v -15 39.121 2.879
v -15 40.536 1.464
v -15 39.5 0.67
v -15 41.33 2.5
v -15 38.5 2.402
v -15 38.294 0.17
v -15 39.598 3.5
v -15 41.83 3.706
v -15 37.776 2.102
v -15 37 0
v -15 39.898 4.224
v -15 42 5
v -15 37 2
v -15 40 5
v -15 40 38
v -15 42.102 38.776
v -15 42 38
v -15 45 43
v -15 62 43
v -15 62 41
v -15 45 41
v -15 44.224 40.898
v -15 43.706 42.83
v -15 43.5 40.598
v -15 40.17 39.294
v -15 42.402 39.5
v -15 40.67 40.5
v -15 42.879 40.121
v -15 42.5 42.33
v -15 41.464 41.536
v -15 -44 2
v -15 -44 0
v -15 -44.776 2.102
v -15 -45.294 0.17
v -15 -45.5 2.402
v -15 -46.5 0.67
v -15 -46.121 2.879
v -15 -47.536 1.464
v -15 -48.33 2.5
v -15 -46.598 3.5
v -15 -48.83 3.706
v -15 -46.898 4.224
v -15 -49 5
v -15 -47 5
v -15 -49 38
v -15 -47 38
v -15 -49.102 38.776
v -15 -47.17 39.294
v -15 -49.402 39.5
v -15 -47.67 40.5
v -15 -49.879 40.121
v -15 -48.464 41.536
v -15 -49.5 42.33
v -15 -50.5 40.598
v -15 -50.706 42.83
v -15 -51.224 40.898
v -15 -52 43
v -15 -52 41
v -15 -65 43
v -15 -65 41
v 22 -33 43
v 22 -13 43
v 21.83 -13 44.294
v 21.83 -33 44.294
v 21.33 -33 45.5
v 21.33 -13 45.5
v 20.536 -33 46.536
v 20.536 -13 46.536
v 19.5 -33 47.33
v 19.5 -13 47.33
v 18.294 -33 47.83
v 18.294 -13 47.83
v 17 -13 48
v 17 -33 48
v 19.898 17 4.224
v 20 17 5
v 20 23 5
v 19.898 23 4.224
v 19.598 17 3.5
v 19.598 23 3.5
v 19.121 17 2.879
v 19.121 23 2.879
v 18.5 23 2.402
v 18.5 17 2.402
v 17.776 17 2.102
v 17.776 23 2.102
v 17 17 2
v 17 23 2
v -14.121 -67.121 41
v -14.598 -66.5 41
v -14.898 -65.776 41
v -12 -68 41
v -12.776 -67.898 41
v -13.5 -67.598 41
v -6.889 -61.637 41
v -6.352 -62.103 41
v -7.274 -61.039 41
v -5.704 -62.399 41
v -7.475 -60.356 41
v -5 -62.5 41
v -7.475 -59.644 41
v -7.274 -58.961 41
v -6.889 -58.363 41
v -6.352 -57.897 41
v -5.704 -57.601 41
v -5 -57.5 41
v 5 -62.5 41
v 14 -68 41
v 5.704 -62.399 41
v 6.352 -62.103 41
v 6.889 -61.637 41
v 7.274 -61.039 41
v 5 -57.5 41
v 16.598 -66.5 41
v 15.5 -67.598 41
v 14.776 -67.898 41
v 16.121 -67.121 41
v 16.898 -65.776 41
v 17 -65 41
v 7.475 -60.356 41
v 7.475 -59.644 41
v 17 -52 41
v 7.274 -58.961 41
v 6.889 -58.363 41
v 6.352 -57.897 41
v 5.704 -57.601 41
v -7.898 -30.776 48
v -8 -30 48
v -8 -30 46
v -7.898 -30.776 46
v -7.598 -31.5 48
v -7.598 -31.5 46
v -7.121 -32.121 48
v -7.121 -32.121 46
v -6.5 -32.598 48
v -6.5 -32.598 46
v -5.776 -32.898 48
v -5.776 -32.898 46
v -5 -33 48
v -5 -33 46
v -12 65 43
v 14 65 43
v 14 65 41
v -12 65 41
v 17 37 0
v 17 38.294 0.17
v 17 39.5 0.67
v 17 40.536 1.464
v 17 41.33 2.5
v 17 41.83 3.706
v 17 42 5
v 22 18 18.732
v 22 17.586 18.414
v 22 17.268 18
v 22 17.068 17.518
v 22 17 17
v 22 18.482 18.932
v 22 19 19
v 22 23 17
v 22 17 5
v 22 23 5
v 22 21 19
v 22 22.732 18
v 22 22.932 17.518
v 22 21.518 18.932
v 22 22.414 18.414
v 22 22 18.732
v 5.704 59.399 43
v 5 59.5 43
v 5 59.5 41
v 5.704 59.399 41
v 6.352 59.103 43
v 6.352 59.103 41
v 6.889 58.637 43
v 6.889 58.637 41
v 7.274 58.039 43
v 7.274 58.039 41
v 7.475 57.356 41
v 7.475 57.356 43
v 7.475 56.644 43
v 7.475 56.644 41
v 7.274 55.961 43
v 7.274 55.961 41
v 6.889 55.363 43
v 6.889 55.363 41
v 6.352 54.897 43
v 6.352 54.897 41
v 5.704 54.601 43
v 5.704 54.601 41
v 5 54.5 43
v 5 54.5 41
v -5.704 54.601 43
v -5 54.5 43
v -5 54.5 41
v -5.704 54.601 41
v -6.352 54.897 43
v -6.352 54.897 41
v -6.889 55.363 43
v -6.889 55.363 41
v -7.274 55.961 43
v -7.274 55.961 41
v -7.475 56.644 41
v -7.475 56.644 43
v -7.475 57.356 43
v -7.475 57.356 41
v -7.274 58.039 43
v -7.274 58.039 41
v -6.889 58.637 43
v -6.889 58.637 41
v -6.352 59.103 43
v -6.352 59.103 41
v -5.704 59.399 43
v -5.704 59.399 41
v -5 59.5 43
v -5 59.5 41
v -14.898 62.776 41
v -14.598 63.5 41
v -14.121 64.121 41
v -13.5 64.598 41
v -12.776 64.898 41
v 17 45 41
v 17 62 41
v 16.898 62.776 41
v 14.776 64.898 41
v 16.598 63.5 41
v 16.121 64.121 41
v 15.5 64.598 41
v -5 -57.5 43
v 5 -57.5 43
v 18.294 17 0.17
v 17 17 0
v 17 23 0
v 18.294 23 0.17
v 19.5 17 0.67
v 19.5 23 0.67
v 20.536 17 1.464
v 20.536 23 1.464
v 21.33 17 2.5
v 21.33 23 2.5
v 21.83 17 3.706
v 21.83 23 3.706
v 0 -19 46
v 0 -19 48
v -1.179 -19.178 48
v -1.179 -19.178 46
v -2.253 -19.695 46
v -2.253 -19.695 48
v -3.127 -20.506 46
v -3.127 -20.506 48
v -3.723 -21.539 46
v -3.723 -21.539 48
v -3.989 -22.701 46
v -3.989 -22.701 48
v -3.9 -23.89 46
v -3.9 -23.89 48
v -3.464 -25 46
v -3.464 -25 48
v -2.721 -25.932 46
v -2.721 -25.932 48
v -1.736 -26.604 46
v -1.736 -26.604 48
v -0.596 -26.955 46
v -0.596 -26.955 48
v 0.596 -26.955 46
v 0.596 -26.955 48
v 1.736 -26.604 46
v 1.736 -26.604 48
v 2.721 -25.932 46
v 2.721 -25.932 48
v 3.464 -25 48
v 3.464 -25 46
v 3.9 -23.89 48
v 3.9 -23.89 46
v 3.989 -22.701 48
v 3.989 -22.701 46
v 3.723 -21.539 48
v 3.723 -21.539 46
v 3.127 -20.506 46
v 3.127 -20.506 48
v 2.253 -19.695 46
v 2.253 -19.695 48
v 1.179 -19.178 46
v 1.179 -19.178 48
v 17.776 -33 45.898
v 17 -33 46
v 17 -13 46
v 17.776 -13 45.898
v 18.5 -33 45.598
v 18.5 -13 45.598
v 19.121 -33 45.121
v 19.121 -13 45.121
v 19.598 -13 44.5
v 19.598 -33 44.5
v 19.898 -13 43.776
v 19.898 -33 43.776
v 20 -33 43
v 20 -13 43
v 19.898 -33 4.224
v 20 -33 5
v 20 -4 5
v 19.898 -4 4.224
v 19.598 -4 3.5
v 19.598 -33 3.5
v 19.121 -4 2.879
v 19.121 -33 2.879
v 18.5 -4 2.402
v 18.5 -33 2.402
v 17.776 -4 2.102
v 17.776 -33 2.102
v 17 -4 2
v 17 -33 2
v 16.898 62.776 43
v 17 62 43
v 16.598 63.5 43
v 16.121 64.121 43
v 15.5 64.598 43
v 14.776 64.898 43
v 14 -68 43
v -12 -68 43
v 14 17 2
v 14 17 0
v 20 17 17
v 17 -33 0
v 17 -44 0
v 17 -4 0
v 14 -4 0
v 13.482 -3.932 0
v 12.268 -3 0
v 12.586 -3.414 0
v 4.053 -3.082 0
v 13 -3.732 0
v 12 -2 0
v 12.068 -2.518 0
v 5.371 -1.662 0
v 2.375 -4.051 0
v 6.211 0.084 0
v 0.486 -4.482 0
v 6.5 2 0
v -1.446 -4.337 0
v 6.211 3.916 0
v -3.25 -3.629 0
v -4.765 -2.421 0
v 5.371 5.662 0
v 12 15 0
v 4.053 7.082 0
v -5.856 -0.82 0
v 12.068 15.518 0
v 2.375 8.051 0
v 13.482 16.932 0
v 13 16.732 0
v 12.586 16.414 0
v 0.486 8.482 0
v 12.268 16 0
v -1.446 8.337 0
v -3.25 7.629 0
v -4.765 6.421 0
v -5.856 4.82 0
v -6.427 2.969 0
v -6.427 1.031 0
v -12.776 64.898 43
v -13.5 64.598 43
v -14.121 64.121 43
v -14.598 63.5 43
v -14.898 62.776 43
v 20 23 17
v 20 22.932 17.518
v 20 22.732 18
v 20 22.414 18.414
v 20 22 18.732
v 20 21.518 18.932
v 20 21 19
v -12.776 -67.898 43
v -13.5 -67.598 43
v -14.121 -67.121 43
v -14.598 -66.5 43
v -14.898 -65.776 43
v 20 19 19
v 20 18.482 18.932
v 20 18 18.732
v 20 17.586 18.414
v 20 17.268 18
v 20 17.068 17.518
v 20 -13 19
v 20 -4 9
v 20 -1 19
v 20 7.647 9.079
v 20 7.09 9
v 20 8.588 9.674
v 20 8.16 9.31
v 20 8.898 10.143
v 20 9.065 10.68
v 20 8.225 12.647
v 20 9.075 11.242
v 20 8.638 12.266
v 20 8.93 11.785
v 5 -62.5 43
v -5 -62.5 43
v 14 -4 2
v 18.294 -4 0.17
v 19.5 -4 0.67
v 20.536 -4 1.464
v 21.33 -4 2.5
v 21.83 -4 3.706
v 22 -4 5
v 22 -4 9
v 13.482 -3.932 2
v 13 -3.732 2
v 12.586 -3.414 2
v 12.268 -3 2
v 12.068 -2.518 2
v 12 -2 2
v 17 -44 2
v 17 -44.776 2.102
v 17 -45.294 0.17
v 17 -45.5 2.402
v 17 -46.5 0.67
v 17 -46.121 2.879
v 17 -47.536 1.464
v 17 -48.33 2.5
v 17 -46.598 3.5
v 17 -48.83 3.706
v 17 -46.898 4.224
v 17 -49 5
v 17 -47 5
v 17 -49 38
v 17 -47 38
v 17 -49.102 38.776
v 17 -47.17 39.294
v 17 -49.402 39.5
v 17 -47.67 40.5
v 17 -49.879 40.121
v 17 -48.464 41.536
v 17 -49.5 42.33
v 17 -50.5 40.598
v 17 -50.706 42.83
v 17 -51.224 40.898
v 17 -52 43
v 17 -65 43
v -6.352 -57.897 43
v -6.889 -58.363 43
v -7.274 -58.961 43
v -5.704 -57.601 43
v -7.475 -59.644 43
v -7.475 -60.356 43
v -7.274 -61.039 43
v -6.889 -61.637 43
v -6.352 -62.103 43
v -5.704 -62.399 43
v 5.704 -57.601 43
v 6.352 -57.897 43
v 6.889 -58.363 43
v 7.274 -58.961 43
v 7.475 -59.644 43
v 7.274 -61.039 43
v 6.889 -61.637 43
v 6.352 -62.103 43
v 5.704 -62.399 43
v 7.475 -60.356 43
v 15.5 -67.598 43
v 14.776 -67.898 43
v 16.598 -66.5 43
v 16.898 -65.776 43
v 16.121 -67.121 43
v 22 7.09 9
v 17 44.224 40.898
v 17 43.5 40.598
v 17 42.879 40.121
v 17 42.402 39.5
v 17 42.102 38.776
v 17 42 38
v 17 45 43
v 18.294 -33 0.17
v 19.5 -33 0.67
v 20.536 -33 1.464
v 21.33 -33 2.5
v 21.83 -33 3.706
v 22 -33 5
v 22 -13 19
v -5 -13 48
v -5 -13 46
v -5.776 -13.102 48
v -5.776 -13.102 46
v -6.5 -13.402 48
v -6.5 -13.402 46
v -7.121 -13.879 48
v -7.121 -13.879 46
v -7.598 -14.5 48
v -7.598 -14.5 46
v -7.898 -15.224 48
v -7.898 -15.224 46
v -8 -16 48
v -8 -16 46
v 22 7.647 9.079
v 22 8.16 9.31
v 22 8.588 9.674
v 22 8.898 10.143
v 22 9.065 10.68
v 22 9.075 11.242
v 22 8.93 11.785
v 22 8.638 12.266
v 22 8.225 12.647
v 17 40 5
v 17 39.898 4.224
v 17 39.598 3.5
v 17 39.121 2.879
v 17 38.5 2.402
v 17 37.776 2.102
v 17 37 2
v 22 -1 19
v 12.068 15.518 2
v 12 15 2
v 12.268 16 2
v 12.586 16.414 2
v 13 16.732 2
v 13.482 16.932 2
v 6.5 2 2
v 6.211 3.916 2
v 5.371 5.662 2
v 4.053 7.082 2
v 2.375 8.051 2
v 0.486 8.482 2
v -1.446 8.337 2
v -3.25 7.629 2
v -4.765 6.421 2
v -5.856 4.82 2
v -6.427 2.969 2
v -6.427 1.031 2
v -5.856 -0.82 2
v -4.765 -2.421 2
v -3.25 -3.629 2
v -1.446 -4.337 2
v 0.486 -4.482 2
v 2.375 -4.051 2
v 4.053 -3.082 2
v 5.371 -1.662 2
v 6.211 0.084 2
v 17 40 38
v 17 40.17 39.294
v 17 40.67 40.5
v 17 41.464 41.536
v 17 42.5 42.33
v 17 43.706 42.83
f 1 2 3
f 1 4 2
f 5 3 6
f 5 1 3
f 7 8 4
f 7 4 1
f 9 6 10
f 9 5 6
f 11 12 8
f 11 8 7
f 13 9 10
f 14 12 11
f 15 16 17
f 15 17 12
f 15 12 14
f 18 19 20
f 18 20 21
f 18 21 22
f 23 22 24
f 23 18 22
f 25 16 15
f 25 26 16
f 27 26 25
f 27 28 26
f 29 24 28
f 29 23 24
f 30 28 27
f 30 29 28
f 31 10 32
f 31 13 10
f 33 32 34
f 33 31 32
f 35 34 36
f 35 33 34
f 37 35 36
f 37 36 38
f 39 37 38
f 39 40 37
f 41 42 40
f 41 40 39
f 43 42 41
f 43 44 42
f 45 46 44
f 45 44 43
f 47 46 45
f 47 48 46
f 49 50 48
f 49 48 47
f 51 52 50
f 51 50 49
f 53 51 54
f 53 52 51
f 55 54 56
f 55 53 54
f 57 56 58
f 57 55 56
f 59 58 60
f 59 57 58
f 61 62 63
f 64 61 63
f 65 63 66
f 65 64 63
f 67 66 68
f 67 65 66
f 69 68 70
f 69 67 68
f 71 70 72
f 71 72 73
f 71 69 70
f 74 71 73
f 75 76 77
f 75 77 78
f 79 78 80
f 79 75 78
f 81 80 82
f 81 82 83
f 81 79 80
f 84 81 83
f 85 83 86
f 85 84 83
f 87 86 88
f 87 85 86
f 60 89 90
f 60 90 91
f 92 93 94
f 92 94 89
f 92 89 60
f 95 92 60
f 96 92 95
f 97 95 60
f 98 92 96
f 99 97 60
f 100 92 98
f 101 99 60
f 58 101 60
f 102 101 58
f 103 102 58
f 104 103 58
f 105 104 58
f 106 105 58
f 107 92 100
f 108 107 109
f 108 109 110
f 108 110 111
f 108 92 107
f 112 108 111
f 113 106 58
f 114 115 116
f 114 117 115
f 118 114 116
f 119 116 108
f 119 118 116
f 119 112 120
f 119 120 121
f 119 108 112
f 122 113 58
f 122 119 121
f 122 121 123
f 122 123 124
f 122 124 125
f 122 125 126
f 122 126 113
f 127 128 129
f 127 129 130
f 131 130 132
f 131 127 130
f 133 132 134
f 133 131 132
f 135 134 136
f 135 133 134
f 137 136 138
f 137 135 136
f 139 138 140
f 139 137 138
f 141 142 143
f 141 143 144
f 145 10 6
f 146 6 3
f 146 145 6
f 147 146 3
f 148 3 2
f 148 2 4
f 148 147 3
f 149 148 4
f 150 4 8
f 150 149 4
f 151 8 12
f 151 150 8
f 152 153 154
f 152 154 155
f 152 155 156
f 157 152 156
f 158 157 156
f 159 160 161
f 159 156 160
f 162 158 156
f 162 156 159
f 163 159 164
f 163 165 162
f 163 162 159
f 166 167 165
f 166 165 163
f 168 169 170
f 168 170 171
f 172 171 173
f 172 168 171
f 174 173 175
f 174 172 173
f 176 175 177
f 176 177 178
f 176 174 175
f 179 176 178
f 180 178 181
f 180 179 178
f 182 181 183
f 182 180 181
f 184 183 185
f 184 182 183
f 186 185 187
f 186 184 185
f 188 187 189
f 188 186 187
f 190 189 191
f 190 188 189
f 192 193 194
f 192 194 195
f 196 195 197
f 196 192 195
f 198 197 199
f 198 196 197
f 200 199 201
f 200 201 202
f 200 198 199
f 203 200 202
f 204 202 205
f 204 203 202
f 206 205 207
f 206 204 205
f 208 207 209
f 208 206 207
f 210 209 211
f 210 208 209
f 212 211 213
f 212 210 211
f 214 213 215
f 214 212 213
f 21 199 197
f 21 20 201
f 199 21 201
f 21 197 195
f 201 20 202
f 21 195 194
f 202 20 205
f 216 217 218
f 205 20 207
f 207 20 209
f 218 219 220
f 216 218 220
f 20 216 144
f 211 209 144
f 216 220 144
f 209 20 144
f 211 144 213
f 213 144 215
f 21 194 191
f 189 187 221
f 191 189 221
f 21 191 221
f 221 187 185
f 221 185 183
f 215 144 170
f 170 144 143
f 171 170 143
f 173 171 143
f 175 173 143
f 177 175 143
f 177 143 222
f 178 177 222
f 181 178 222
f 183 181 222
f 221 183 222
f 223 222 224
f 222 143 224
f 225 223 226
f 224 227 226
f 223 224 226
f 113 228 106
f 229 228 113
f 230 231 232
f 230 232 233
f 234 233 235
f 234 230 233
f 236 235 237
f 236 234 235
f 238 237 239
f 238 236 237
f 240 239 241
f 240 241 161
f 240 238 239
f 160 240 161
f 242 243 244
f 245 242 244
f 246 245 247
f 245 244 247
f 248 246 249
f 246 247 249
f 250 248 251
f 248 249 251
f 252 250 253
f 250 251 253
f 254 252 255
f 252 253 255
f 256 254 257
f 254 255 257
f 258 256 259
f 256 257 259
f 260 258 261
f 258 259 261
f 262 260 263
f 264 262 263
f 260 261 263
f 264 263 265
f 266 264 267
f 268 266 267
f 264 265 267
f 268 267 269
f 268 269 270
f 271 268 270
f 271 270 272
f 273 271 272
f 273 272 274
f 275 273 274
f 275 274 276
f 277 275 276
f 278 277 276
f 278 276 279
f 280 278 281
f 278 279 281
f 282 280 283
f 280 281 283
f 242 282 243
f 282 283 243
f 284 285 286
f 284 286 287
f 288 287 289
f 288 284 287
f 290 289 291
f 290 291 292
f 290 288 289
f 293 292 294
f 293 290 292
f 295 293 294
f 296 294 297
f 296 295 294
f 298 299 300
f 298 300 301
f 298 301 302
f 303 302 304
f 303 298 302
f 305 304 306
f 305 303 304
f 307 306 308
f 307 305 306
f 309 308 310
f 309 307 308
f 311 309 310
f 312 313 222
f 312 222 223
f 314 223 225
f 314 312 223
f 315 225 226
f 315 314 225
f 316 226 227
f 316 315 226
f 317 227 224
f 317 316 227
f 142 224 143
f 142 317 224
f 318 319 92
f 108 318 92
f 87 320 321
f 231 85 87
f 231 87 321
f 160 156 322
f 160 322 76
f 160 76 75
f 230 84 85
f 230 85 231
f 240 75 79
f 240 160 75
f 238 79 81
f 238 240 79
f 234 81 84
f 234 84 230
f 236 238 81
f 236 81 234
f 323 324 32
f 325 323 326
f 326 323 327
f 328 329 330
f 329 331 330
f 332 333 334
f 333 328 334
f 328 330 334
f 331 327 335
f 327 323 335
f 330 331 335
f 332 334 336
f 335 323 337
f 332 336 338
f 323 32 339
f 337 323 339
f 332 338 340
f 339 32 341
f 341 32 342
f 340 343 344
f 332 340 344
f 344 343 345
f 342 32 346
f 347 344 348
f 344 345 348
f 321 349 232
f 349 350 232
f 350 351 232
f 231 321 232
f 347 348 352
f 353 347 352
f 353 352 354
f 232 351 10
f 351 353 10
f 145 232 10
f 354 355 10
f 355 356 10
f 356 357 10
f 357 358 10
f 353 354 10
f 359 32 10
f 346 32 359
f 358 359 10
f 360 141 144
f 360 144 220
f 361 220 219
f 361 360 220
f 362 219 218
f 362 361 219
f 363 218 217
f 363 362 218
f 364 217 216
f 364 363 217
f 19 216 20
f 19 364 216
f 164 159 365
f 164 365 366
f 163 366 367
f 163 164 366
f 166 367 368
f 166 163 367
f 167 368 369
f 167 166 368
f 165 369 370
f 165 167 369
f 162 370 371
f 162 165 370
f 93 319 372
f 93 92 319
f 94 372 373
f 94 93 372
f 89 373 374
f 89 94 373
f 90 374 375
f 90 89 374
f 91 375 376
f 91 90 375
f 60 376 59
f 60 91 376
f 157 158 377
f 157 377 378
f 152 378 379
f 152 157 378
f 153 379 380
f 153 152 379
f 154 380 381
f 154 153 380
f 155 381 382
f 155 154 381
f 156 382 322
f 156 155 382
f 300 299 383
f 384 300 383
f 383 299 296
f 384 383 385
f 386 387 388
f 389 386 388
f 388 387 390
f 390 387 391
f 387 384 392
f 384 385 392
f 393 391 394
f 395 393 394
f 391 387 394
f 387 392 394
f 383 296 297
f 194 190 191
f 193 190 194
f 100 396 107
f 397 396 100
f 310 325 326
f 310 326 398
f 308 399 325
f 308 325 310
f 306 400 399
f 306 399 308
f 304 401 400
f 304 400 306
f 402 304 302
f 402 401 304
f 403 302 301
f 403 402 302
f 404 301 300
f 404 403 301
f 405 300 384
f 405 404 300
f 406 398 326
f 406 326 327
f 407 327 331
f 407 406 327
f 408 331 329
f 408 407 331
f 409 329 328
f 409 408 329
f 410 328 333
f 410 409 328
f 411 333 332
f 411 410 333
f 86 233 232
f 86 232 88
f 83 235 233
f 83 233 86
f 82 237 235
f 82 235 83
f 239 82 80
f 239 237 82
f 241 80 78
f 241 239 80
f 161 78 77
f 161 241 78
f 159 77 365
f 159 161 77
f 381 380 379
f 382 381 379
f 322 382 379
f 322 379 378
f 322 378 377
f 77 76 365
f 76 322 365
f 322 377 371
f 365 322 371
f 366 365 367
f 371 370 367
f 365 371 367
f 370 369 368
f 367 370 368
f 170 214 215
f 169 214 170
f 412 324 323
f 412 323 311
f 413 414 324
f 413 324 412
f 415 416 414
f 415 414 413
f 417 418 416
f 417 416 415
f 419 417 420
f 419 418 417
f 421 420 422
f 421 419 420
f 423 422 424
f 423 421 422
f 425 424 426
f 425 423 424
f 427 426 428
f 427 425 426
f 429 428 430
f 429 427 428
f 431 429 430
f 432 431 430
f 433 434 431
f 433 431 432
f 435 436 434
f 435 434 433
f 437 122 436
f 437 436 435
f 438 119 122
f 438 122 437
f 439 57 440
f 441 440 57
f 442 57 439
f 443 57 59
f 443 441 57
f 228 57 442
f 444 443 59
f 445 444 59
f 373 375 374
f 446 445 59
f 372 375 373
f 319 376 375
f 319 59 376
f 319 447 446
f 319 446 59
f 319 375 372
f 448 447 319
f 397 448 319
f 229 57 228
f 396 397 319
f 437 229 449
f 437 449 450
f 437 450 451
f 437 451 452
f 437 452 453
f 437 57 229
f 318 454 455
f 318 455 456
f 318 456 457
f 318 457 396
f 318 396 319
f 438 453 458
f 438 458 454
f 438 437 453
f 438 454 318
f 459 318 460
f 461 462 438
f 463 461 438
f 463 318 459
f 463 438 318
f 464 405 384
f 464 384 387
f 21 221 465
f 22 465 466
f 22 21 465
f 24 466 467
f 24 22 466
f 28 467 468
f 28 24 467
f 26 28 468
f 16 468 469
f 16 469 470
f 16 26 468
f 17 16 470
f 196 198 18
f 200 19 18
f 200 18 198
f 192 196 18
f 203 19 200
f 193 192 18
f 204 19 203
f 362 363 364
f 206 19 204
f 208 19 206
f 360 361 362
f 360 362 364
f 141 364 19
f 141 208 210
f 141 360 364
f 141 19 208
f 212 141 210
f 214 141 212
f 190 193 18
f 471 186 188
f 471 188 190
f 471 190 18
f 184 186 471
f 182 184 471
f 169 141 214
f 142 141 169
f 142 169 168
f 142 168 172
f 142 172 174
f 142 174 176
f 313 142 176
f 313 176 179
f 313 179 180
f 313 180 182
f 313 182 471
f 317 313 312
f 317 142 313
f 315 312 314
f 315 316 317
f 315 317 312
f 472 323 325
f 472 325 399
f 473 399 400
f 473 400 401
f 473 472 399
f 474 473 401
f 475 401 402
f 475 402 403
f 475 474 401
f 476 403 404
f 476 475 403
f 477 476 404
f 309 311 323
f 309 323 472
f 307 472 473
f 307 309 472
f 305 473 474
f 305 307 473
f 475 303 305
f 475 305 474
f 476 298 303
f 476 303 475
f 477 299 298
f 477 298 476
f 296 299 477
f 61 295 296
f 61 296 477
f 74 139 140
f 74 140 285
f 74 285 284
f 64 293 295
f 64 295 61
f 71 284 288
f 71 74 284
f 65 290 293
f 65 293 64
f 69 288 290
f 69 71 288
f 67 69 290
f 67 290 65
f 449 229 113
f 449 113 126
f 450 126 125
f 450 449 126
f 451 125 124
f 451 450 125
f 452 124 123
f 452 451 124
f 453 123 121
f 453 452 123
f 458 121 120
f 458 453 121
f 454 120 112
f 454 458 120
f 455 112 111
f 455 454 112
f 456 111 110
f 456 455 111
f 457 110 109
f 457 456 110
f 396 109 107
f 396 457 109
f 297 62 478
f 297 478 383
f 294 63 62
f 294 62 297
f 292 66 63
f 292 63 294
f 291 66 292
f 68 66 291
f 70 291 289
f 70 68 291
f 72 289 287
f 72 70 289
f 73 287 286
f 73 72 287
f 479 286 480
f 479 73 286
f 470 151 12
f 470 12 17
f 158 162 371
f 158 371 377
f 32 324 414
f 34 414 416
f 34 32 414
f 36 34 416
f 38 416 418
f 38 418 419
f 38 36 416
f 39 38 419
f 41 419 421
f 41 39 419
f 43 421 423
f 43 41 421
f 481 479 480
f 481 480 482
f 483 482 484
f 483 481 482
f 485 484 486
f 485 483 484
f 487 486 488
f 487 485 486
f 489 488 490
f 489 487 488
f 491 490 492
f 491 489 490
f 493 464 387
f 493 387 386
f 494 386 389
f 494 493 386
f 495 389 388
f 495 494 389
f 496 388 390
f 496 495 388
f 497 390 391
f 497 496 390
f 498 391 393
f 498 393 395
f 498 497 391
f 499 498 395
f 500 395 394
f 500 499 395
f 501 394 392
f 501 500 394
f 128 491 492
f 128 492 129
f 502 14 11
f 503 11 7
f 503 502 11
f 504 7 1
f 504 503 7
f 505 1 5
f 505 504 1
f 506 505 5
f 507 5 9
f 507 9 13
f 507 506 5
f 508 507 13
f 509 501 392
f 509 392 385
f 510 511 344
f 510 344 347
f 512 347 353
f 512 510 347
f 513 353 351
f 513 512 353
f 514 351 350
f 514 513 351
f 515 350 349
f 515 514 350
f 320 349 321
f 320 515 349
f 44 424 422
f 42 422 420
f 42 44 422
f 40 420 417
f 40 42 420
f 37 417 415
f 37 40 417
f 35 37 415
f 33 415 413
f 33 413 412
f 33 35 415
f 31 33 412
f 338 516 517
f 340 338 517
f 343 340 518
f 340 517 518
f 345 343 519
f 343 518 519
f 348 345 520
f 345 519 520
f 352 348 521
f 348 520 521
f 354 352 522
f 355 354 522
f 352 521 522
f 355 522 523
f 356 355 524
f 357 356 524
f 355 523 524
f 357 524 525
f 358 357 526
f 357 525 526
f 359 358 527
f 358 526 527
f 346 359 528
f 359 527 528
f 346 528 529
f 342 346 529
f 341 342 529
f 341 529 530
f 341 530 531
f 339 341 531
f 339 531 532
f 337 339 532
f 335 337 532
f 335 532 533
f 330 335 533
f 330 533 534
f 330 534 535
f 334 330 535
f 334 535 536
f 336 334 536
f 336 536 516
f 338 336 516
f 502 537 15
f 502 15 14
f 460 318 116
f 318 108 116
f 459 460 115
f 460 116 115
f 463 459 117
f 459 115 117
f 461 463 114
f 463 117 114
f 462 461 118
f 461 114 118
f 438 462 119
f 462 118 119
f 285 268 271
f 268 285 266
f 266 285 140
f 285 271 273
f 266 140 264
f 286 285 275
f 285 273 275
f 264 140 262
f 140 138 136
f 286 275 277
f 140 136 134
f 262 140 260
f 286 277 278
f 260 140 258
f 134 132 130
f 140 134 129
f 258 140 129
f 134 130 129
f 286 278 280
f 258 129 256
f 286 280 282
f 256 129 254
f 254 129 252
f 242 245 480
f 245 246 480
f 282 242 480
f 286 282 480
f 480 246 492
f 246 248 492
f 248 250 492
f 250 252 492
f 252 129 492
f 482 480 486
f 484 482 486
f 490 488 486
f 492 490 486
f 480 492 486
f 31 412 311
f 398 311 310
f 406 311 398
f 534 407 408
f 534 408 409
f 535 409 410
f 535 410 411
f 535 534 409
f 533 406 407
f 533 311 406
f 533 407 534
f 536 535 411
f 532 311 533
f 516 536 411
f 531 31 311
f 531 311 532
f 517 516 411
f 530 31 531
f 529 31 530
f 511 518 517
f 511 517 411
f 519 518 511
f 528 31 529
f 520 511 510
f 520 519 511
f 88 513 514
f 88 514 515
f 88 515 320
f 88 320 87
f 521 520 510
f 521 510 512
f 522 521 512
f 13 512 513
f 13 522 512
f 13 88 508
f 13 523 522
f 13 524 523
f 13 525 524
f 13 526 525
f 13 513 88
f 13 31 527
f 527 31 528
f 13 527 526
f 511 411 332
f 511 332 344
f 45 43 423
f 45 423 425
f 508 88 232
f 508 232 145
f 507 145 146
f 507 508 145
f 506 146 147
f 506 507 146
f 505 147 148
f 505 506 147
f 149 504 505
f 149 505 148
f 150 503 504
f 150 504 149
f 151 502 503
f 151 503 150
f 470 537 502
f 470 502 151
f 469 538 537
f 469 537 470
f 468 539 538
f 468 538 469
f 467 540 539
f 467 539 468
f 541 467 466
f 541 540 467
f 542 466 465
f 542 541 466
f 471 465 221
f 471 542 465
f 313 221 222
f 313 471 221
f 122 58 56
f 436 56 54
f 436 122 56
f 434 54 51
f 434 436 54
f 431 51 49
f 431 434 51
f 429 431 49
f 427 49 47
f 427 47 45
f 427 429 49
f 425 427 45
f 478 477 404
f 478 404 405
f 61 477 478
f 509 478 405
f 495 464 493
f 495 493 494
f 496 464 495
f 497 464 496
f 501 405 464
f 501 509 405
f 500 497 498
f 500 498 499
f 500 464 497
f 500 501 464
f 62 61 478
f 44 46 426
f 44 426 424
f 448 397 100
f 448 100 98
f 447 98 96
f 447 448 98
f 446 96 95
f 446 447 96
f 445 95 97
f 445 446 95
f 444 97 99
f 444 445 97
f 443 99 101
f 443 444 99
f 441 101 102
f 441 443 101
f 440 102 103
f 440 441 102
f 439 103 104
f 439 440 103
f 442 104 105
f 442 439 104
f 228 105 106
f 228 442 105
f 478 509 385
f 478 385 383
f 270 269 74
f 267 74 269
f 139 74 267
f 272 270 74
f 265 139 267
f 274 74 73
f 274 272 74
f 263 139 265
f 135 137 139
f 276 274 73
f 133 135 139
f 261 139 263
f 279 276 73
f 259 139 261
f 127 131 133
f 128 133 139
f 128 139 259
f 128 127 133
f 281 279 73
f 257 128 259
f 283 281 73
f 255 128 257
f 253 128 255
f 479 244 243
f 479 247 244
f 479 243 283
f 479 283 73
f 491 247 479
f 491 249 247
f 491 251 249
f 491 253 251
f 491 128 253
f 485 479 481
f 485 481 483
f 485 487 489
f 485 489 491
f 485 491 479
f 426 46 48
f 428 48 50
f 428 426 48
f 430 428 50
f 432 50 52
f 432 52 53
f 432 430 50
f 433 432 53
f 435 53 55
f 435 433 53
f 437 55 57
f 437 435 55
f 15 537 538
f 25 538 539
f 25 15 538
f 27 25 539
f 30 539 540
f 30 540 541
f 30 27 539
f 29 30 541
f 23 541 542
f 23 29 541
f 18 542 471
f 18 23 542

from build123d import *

# Parameters (mm, degrees)
SKETCH1_W                    = 91
SKETCH1_H                    = 32
BASE_FLANGE1_DEPTH           = 2
EDGE_FLANGE1_STRIP_W         = 14
EDGE_FLANGE1_STRIP_H         = 2
EDGE_FLANGE1_STRIP_CUT_DEPTH = 32
EDGE_FLANGE1_DEPTH           = 32
EDGE_FLANGE2_STRIP_W         = 14
EDGE_FLANGE2_STRIP_H         = 2
EDGE_FLANGE2_STRIP_CUT_DEPTH = 32
EDGE_FLANGE2_DEPTH           = 32
FILLET1_R                    = 3
EDGE_FLANGE3_DEPTH           = 29
EDGE_FLANGE3_START           = 2
EDGE_FLANGE3_FLAT_DEPTH      = 2
EDGE_FLANGE4_DEPTH           = 20
EDGE_FLANGE4_START           = 2
EDGE_FLANGE4_PROFILE_R       = 4
EDGE_FLANGE4_FLAT_DEPTH      = 2
SKETCH18_R                   = 6.5
CUT_EXTRUDE1_DEPTH           = 10
EDGE_FLANGE5_DEPTH           = 6
EDGE_FLANGE5_START           = 2
EDGE_FLANGE5_FLAT_DEPTH      = 2
EDGE_FLANGE6_STRIP_W         = 14
EDGE_FLANGE6_STRIP_H         = 2
EDGE_FLANGE6_STRIP_CUT_DEPTH = 32
EDGE_FLANGE6_DEPTH           = 32
EDGE_FLANGE7_STRIP_W         = 14
EDGE_FLANGE7_STRIP_H         = 2
EDGE_FLANGE7_STRIP_CUT_DEPTH = 32
EDGE_FLANGE7_DEPTH           = 32
EDGE_FLANGE7_FLAT_DEPTH      = 2
CUT_EXTRUDE2_DEPTH           = 10


# Sheet-metal steps are written as plain solids
with BuildPart() as part:
    # Sketch1 → Base-Flange1 (new body)
    with BuildSketch(Plane(origin=(0, 0, 0), x_dir=(0, 1, 0), z_dir=(0, 0, 1))):
        with Locations((-3.5, -1)):
            Rectangle(SKETCH1_W, SKETCH1_H)
    extrude(amount=BASE_FLANGE1_DEPTH)

    # Edge-Flange1 strip (across the edge) → Edge-Flange1 strip cut (cut)
    with BuildSketch(Plane(origin=(-15, -49, 2), x_dir=(0, 1, 0), z_dir=(1, 0, 0))):
        with Locations((-2, -1)):
            Rectangle(EDGE_FLANGE1_STRIP_W, EDGE_FLANGE1_STRIP_H)
    extrude(amount=EDGE_FLANGE1_STRIP_CUT_DEPTH, mode=Mode.SUBTRACT)

    # Edge-Flange1 section (across the edge) → Edge-Flange1 (add)
    with BuildSketch(Plane(origin=(-15, -49, 2), x_dir=(0, 1, 0), z_dir=(1, 0, 0))):
        with BuildLine():
            Line((0, 3), (0, 41))
            Line((0, 41), (2, 41))
            Line((2, 41), (2, 3))
            ThreePointArc((2, 3), (2.878679656, 0.878679656), (5, 0))
            Line((5, 0), (5, -2))
            ThreePointArc((5, -2), (1.464466094, -0.535533906), (0, 3))
        make_face()
    extrude(amount=EDGE_FLANGE1_DEPTH)

    # Edge-Flange2 strip (across the edge) → Edge-Flange2 strip cut (cut)
    with BuildSketch(Plane(origin=(17, -49, 43), x_dir=(0, 0, -1), z_dir=(-1, 0, 0))):
        with Locations((-2, -1)):
            Rectangle(EDGE_FLANGE2_STRIP_W, EDGE_FLANGE2_STRIP_H)
    extrude(amount=EDGE_FLANGE2_STRIP_CUT_DEPTH, mode=Mode.SUBTRACT)

    # Edge-Flange2 section (across the edge) → Edge-Flange2 (add)
    with BuildSketch(Plane(origin=(17, -49, 43), x_dir=(0, 0, -1), z_dir=(-1, 0, 0))):
        with BuildLine():
            Line((0, 3), (0, 19))
            Line((0, 19), (2, 19))
            Line((2, 19), (2, 3))
            ThreePointArc((2, 3), (2.878679656, 0.878679656), (5, 0))
            Line((5, 0), (5, -2))
            ThreePointArc((5, -2), (1.464466094, -0.535533906), (0, 3))
        make_face()
    extrude(amount=EDGE_FLANGE2_DEPTH)

    # Fillet1
    fillet1_edges = [part.edges().sort_by_distance(p)[0] for p in [
        (17, -68, 42),
        (-15, -68, 42),
    ]]
    fillet(fillet1_edges, radius=FILLET1_R)

    # Edge-Flange3 bend section (across the edge) → Edge-Flange3 (add)
    with BuildSketch(Plane(origin=(20, -33, 2), x_dir=(-1, 0, 0), z_dir=(0, 1, 0))):
        with BuildLine():
            Line((-2, 3), (0, 3))
            ThreePointArc((0, 3), (0.878679656, 0.878679656), (3, 0))
            Line((3, 0), (3, -2))
            ThreePointArc((3, -2), (-0.535533906, -0.535533906), (-2, 3))
        make_face()
    extrude(amount=EDGE_FLANGE3_DEPTH)

    # Edge-Flange3 profile (on flange) → Edge-Flange3 flat (add)
    with BuildSketch(Plane(origin=(20, 0, 2), x_dir=(0, 1, 0), z_dir=(1, 0, 0)).offset(EDGE_FLANGE3_START)):
        with BuildLine():
            Line((-33, 41), (-33, 3))
            Line((-33, 3), (-4, 3))
            Line((-4, 3), (-4, 7))
            Line((-4, 7), (7.090242207, 7))
            ThreePointArc((7.090242207, 7), (9, 8.406009114), (8.22462093, 10.647174828))
            Line((8.22462093, 10.647174828), (-1, 17))
            Line((-1, 17), (-13, 17))
            Line((-13, 17), (-13, 41))
            Line((-13, 41), (-33, 41))
        make_face()
    extrude(amount=-EDGE_FLANGE3_FLAT_DEPTH)

    # Edge-Flange4 bend section (across the edge) → Edge-Flange4 (add)
    with BuildSketch(Plane(origin=(20, -33, 46), x_dir=(0, 0, -1), z_dir=(0, 1, 0))):
        with BuildLine():
            Line((-2, 3), (0, 3))
            ThreePointArc((0, 3), (0.878679656, 0.878679656), (3, 0))
            Line((3, 0), (3, -2))
            ThreePointArc((3, -2), (-0.535533906, -0.535533906), (-2, 3))
        make_face()
    extrude(amount=EDGE_FLANGE4_DEPTH)

    # Edge-Flange4 profile (on flange) → Edge-Flange4 flat (add)
    with BuildSketch(Plane(origin=(20, 0, 46), x_dir=(0, 1, 0), z_dir=(0, 0, 1)).offset(EDGE_FLANGE4_START)):
        with BuildLine():
            ThreePointArc((-13, 25), (-13.878679656, 27.121320344), (-16, 28))
            Line((-16, 28), (-30, 28))
            ThreePointArc((-30, 28), (-32.121320344, 27.121320344), (-33, 25))
            Line((-33, 25), (-33, 3))
            Line((-33, 3), (-13, 3))
            Line((-13, 3), (-13, 25))
        make_face()
        with Locations((-23, 20)):
            Circle(EDGE_FLANGE4_PROFILE_R, mode=Mode.SUBTRACT)
    extrude(amount=-EDGE_FLANGE4_FLAT_DEPTH)

    # Sketch18 → Cut-Extrude1 (cut)
    with BuildSketch(Plane.XY.offset(2)):
        with Locations((0, 2)):
            Circle(SKETCH18_R)
        with BuildLine():
            Line((17, -4), (14, -4))
            ThreePointArc((14, -4), (12.585786438, -3.414213562), (12, -2))
            Line((12, -2), (12, 15))
            ThreePointArc((12, 15), (12.585786438, 16.414213562), (14, 17))
            Line((14, 17), (17, 17))
            Line((17, 17), (17, -4))
        make_face()
    extrude(amount=-CUT_EXTRUDE1_DEPTH, mode=Mode.SUBTRACT)

    # Edge-Flange5 bend section (across the edge) → Edge-Flange5 (add)
    with BuildSketch(Plane(origin=(20, 17, 2), x_dir=(-1, 0, 0), z_dir=(0, 1, 0))):
        with BuildLine():
            Line((-2, 3), (0, 3))
            ThreePointArc((0, 3), (0.878679656, 0.878679656), (3, 0))
            Line((3, 0), (3, -2))
            ThreePointArc((3, -2), (-0.535533906, -0.535533906), (-2, 3))
        make_face()
    extrude(amount=EDGE_FLANGE5_DEPTH)

    # Edge-Flange5 profile (on flange) → Edge-Flange5 flat (add)
    with BuildSketch(Plane(origin=(20, 0, 2), x_dir=(0, 1, 0), z_dir=(1, 0, 0)).offset(EDGE_FLANGE5_START)):
        with BuildLine():
            Line((17, 3), (23, 3))
            Line((23, 3), (23, 15))
            ThreePointArc((23, 15), (22.414213562, 16.414213562), (21, 17))
            Line((21, 17), (19, 17))
            ThreePointArc((19, 17), (17.585786438, 16.414213562), (17, 15))
            Line((17, 15), (17, 3))
        make_face()
    extrude(amount=-EDGE_FLANGE5_FLAT_DEPTH)

    # Edge-Flange6 strip (across the edge) → Edge-Flange6 strip cut (cut)
    with BuildSketch(Plane(origin=(17, 42, 2), x_dir=(0, -1, 0), z_dir=(-1, 0, 0))):
        with Locations((-2, -1)):
            Rectangle(EDGE_FLANGE6_STRIP_W, EDGE_FLANGE6_STRIP_H)
    extrude(amount=EDGE_FLANGE6_STRIP_CUT_DEPTH, mode=Mode.SUBTRACT)

    # Edge-Flange6 section (across the edge) → Edge-Flange6 (add)
    with BuildSketch(Plane(origin=(17, 42, 2), x_dir=(0, -1, 0), z_dir=(-1, 0, 0))):
        with BuildLine():
            Line((0, 3), (0, 41))
            Line((0, 41), (2, 41))
            Line((2, 41), (2, 3))
            ThreePointArc((2, 3), (2.878679656, 0.878679656), (5, 0))
            Line((5, 0), (5, -2))
            ThreePointArc((5, -2), (1.464466094, -0.535533906), (0, 3))
        make_face()
    extrude(amount=EDGE_FLANGE6_DEPTH)

    # Edge-Flange7 strip (across the edge) → Edge-Flange7 strip cut (cut)
    with BuildSketch(Plane(origin=(-15, 42, 43), x_dir=(0, 0, -1), z_dir=(1, 0, 0))):
        with Locations((-2, -1)):
            Rectangle(EDGE_FLANGE7_STRIP_W, EDGE_FLANGE7_STRIP_H)
    extrude(amount=EDGE_FLANGE7_STRIP_CUT_DEPTH, mode=Mode.SUBTRACT)

    # Edge-Flange7 bend section (across the edge) → Edge-Flange7 (add)
    with BuildSketch(Plane(origin=(-15, 42, 43), x_dir=(0, 0, -1), z_dir=(1, 0, 0))):
        with BuildLine():
            Line((0, 3), (2, 3))
            ThreePointArc((2, 3), (2.878679656, 0.878679656), (5, 0))
            Line((5, 0), (5, -2))
            ThreePointArc((5, -2), (1.464466094, -0.535533906), (0, 3))
        make_face()
    extrude(amount=EDGE_FLANGE7_DEPTH)

    # Edge-Flange7 profile (on flange) → Edge-Flange7 flat (add)
    with BuildSketch(Plane(origin=(0, 42, 43), x_dir=(1, 0, 0), z_dir=(0, 0, 1))):
        with BuildLine():
            ThreePointArc((-12, 23), (-14.121320344, 22.121320344), (-15, 20))
            Line((-15, 20), (-15, 3))
            Line((-15, 3), (17, 3))
            Line((17, 3), (17, 20))
            ThreePointArc((17, 20), (16.121320344, 22.121320344), (14, 23))
            Line((14, 23), (-12, 23))
        make_face()
        with BuildLine():
            Line((-5, 17.5), (5, 17.5))
            ThreePointArc((5, 17.5), (7.5, 15), (5, 12.5))
            Line((5, 12.5), (-5, 12.5))
            ThreePointArc((-5, 12.5), (-7.5, 15), (-5, 17.5))
        make_face(mode=Mode.SUBTRACT)
    extrude(amount=-EDGE_FLANGE7_FLAT_DEPTH)

    # Sketch28 → Cut-Extrude2 (cut)
    with BuildSketch(Plane.XY.offset(43)):
        with BuildLine():
            Line((-5, -57.5), (5, -57.5))
            ThreePointArc((5, -57.5), (7.5, -60), (5, -62.5))
            Line((5, -62.5), (-5, -62.5))
            ThreePointArc((-5, -62.5), (-7.5, -60), (-5, -57.5))
        make_face()
    extrude(amount=-CUT_EXTRUDE2_DEPTH, mode=Mode.SUBTRACT)


solid = part.part
